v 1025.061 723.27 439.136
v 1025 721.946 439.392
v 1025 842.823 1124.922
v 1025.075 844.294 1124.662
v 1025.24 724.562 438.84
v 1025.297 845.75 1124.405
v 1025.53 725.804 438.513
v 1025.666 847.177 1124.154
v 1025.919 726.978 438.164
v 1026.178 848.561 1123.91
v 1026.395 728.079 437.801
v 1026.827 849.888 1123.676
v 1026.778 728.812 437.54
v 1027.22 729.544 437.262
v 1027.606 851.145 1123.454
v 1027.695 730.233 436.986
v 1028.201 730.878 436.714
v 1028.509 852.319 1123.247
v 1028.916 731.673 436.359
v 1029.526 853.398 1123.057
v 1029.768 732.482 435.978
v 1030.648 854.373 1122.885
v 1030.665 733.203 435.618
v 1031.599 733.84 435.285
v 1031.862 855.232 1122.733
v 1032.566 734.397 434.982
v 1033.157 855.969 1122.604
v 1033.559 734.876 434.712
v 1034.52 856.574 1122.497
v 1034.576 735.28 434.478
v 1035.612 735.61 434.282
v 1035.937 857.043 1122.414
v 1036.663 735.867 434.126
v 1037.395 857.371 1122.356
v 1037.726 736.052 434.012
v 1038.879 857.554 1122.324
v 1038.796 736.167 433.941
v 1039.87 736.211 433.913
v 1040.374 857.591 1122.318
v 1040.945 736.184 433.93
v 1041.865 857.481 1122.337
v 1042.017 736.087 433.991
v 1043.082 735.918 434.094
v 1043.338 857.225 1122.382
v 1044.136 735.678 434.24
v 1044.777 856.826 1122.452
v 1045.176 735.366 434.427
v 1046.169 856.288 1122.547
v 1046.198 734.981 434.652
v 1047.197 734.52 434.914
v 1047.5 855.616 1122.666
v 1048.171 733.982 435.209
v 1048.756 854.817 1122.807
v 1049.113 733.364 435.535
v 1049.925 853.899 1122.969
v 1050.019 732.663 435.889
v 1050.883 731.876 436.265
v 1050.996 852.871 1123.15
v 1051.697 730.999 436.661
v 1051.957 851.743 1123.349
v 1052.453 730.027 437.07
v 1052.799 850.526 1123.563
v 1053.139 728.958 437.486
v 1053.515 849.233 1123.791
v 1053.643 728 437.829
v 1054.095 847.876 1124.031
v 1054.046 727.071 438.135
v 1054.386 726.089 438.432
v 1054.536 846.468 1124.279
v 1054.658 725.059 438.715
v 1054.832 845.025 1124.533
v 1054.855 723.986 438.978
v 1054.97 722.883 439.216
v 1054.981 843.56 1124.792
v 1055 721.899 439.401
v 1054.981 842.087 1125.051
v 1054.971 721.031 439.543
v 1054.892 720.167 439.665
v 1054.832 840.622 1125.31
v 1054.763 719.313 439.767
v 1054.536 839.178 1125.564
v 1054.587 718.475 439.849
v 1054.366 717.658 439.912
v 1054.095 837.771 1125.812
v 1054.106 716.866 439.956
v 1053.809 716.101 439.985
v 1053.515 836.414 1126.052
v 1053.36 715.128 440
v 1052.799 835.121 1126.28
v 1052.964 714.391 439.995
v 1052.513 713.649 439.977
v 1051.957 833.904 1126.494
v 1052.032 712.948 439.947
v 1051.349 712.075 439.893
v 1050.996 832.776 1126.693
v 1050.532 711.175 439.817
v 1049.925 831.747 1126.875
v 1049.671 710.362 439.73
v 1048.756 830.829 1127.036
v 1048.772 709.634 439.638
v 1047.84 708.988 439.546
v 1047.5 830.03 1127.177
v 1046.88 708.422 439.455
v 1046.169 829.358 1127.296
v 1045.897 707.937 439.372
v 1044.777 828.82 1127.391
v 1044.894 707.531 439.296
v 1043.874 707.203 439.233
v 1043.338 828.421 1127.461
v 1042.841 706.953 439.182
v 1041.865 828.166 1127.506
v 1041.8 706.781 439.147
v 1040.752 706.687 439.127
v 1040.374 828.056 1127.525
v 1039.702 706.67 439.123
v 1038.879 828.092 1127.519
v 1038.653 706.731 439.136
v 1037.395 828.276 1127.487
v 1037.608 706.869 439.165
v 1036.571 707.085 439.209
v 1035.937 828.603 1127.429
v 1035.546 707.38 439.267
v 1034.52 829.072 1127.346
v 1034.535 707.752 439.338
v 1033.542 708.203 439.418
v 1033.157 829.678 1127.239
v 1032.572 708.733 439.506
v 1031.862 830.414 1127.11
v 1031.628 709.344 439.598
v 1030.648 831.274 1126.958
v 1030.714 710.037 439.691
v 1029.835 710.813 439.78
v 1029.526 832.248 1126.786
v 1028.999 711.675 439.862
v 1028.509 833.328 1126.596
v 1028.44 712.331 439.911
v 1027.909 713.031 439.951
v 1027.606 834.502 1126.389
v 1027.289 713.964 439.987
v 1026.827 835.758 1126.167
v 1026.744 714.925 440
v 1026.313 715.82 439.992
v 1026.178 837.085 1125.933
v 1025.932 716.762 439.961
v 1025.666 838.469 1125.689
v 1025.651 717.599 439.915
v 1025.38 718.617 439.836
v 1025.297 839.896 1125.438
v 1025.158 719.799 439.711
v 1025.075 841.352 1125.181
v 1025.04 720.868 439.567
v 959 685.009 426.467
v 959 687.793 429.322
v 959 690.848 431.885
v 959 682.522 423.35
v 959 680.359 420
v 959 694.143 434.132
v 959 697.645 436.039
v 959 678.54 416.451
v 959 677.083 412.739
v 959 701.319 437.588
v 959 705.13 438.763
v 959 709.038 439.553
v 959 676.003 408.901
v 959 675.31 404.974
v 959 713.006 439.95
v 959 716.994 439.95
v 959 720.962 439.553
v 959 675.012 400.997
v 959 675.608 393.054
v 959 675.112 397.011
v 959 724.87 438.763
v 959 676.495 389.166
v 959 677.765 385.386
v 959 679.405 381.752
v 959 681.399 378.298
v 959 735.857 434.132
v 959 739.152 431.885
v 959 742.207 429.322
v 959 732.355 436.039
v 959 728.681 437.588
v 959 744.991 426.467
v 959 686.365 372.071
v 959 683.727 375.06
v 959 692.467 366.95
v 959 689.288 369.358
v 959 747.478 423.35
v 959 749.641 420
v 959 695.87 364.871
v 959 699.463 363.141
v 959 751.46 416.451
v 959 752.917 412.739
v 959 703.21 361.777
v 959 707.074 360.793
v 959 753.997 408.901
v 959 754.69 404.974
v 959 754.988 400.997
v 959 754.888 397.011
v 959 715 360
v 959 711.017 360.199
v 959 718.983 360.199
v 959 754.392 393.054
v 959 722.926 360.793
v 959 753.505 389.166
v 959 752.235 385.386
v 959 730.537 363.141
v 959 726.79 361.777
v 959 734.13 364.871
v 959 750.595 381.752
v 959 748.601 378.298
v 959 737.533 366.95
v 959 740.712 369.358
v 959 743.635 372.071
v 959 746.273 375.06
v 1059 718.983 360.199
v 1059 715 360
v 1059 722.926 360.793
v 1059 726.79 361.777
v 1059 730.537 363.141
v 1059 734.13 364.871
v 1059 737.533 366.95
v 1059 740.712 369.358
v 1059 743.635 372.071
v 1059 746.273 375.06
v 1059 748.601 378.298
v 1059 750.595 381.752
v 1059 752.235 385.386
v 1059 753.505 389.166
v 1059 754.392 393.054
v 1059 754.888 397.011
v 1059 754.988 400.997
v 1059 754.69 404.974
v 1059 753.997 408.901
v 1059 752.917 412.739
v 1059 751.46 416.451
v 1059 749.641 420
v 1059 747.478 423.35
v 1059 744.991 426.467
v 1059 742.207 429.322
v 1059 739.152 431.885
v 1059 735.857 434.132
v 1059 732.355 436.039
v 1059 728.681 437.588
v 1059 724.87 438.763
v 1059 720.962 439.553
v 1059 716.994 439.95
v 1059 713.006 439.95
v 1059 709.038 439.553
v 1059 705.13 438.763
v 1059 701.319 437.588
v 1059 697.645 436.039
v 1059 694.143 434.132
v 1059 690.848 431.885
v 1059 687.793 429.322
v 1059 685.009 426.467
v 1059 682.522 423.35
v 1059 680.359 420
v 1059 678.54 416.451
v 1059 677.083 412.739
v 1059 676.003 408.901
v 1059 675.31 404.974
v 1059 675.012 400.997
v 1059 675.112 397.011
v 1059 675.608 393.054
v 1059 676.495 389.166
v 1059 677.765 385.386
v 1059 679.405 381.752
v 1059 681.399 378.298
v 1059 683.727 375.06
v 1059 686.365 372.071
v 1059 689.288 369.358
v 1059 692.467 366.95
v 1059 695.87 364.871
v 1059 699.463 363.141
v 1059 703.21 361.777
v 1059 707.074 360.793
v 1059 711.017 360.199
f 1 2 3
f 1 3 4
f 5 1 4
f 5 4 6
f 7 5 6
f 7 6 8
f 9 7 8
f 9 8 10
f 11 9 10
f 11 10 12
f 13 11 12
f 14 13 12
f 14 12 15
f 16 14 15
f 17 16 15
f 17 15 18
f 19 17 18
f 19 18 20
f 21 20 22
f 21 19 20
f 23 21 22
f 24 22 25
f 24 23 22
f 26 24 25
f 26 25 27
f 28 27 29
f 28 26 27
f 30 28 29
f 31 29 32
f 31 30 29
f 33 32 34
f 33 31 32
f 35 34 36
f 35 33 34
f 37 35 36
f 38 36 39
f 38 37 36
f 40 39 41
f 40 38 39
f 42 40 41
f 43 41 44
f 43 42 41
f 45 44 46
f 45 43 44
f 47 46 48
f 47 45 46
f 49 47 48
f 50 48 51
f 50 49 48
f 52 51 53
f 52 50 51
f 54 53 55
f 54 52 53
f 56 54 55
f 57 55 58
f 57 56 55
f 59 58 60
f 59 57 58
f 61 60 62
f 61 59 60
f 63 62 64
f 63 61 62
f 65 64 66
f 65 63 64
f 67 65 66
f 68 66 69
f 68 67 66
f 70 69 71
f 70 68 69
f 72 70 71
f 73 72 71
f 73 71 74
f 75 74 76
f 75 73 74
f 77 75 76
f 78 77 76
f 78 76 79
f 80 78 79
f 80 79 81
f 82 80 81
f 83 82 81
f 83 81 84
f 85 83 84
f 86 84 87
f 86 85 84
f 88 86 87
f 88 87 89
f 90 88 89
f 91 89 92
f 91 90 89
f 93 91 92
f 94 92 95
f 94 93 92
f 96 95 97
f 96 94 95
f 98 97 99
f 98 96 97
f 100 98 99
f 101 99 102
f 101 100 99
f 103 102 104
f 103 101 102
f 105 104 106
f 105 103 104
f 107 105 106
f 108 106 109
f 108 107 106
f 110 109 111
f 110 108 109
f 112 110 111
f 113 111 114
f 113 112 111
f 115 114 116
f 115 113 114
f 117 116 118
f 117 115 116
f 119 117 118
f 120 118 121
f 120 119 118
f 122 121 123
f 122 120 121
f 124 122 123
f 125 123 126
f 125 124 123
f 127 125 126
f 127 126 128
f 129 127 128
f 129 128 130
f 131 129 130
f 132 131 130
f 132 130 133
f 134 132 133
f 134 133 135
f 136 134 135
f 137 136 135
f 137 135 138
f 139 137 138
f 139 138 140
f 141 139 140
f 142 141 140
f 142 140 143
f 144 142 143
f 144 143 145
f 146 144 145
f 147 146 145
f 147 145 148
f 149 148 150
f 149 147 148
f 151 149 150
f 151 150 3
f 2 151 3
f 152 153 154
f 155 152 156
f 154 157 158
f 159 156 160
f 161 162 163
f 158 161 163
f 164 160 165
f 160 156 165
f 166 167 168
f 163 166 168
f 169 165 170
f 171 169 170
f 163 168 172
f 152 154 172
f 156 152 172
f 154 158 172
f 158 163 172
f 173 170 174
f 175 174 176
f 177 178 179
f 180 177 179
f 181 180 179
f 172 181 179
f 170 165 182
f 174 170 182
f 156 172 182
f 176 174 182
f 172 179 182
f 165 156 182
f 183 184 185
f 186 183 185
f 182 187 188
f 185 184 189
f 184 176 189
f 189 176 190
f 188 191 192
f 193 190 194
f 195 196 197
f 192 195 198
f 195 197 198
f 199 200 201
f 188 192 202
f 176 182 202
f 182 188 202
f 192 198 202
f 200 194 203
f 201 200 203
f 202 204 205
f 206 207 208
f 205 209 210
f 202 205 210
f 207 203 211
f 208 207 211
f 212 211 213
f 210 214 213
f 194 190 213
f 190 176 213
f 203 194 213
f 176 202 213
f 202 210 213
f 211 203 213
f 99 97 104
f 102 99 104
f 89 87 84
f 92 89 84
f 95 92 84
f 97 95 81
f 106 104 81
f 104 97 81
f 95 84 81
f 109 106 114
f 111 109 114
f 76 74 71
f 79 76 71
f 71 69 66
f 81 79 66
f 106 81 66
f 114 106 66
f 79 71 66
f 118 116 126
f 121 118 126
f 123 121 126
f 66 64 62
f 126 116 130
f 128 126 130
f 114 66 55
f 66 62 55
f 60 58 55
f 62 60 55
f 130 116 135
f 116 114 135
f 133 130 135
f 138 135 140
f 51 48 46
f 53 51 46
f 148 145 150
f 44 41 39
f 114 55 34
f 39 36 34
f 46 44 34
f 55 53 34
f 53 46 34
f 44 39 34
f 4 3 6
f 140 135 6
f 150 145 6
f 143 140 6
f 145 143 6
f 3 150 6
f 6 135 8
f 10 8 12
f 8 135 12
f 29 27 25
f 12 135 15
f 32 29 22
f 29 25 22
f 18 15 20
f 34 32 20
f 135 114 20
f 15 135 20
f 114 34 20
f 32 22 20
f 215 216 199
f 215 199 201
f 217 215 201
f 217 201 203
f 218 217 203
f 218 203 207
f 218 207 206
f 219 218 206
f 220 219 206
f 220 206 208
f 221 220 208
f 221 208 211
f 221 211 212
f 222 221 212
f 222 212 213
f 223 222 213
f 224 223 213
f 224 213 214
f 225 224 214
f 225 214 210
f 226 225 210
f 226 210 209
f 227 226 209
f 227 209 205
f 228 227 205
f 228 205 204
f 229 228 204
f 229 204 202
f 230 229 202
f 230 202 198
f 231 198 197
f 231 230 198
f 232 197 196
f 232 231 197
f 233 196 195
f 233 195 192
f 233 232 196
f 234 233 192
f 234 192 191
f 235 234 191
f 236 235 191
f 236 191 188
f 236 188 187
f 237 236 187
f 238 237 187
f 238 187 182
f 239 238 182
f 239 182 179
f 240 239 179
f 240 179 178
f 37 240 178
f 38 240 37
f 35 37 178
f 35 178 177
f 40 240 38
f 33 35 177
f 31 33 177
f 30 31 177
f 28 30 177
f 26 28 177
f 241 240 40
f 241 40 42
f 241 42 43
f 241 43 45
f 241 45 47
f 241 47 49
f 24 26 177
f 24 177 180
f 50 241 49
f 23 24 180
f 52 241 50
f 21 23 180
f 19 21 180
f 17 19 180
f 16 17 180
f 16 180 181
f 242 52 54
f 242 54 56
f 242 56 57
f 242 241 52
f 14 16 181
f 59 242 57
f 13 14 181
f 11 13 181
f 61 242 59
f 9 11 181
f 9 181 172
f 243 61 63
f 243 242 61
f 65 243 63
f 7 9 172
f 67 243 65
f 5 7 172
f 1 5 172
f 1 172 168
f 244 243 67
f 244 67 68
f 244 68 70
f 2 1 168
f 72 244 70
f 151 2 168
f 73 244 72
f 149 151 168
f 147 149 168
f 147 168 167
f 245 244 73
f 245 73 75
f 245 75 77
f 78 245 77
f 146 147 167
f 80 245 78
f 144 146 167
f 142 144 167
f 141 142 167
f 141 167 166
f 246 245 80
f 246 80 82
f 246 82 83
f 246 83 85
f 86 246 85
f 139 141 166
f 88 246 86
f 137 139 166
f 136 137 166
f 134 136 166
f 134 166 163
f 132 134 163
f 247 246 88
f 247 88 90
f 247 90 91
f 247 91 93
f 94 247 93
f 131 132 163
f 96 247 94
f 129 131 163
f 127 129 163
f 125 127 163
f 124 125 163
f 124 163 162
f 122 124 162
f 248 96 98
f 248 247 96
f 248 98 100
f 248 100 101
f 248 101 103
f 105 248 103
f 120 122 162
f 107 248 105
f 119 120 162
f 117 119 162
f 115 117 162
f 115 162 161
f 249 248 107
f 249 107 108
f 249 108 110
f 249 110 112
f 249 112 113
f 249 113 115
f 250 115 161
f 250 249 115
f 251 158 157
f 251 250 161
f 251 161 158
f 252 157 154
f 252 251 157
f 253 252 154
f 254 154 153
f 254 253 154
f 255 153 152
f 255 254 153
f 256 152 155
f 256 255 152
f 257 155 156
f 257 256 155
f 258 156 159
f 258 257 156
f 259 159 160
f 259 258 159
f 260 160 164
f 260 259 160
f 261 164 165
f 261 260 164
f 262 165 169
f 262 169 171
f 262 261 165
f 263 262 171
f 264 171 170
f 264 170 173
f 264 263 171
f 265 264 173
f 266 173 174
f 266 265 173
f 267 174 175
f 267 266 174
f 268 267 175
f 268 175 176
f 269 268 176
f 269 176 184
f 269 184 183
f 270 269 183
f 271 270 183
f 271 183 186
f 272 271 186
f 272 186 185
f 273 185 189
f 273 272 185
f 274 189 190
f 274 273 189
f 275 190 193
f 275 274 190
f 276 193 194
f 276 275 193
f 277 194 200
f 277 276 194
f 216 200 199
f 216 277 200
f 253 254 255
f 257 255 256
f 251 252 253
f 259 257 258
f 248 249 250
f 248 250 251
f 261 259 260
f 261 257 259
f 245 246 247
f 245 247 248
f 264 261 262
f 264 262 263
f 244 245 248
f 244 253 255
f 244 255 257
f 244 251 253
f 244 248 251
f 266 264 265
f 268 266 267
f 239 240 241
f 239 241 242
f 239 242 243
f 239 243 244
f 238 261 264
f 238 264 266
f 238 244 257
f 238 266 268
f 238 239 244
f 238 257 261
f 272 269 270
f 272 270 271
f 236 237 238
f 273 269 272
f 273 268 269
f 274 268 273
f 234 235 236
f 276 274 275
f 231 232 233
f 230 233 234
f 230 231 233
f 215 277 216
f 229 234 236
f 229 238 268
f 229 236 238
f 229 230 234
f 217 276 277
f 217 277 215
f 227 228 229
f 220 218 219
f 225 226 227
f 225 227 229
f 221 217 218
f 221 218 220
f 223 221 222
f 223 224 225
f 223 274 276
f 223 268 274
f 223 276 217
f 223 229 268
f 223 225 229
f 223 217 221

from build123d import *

# Parameters (mm, degrees)
CYLINDER002_R           = 40
CYLINDER002_DEPTH       = 100
CYLINDER002_PITCH_ANGLE = 90
CYLINDER001_R           = 15
CYLINDER001_DEPTH       = 736.104612
CYLINDER001_ROLL_ANGLE  = -10


with BuildPart() as eje_brazo:
    # Cylinder002 → Cylinder002 (new body)
    with BuildSketch(Plane.XY):
        Circle(CYLINDER002_R)
    extrude(amount=CYLINDER002_DEPTH)


with BuildPart() as eje_brazo_1:
    # Cylinder002 pitch: moved
    add(eje_brazo.part.rotate(Axis((0, 0, 0), (0, 1, 0)), CYLINDER002_PITCH_ANGLE))


with BuildPart() as eje_brazo_2:
    # Cylinder002 placement: moved
    add(eje_brazo_1.part.moved(Location((-59, 715, 400))))


with BuildPart() as brazo:
    # Cylinder001 → Cylinder001 (new body)
    with BuildSketch(Plane.XY):
        Circle(CYLINDER001_R)
    extrude(amount=CYLINDER001_DEPTH)


with BuildPart() as brazo_1:
    # Cylinder001 roll: moved
    add(brazo.part.rotate(Axis((0, 0, 0), (1, 0, 0)), CYLINDER001_ROLL_ANGLE))


with BuildPart() as brazo_2:
    # Cylinder001 placement: moved
    add(brazo_1.part.moved(Location((-40, 715, 400))))

    # Fusion: union Eje_brazo
    add(eje_brazo_2.part)


with BuildPart() as brazos:
    # mirror: instance of Brazo
    add(brazo_2.part.mirror(Plane(origin=(500, 0, 0), x_dir=(0, -1, 0), z_dir=(1, 0, 0))))


solid = brazos.part
